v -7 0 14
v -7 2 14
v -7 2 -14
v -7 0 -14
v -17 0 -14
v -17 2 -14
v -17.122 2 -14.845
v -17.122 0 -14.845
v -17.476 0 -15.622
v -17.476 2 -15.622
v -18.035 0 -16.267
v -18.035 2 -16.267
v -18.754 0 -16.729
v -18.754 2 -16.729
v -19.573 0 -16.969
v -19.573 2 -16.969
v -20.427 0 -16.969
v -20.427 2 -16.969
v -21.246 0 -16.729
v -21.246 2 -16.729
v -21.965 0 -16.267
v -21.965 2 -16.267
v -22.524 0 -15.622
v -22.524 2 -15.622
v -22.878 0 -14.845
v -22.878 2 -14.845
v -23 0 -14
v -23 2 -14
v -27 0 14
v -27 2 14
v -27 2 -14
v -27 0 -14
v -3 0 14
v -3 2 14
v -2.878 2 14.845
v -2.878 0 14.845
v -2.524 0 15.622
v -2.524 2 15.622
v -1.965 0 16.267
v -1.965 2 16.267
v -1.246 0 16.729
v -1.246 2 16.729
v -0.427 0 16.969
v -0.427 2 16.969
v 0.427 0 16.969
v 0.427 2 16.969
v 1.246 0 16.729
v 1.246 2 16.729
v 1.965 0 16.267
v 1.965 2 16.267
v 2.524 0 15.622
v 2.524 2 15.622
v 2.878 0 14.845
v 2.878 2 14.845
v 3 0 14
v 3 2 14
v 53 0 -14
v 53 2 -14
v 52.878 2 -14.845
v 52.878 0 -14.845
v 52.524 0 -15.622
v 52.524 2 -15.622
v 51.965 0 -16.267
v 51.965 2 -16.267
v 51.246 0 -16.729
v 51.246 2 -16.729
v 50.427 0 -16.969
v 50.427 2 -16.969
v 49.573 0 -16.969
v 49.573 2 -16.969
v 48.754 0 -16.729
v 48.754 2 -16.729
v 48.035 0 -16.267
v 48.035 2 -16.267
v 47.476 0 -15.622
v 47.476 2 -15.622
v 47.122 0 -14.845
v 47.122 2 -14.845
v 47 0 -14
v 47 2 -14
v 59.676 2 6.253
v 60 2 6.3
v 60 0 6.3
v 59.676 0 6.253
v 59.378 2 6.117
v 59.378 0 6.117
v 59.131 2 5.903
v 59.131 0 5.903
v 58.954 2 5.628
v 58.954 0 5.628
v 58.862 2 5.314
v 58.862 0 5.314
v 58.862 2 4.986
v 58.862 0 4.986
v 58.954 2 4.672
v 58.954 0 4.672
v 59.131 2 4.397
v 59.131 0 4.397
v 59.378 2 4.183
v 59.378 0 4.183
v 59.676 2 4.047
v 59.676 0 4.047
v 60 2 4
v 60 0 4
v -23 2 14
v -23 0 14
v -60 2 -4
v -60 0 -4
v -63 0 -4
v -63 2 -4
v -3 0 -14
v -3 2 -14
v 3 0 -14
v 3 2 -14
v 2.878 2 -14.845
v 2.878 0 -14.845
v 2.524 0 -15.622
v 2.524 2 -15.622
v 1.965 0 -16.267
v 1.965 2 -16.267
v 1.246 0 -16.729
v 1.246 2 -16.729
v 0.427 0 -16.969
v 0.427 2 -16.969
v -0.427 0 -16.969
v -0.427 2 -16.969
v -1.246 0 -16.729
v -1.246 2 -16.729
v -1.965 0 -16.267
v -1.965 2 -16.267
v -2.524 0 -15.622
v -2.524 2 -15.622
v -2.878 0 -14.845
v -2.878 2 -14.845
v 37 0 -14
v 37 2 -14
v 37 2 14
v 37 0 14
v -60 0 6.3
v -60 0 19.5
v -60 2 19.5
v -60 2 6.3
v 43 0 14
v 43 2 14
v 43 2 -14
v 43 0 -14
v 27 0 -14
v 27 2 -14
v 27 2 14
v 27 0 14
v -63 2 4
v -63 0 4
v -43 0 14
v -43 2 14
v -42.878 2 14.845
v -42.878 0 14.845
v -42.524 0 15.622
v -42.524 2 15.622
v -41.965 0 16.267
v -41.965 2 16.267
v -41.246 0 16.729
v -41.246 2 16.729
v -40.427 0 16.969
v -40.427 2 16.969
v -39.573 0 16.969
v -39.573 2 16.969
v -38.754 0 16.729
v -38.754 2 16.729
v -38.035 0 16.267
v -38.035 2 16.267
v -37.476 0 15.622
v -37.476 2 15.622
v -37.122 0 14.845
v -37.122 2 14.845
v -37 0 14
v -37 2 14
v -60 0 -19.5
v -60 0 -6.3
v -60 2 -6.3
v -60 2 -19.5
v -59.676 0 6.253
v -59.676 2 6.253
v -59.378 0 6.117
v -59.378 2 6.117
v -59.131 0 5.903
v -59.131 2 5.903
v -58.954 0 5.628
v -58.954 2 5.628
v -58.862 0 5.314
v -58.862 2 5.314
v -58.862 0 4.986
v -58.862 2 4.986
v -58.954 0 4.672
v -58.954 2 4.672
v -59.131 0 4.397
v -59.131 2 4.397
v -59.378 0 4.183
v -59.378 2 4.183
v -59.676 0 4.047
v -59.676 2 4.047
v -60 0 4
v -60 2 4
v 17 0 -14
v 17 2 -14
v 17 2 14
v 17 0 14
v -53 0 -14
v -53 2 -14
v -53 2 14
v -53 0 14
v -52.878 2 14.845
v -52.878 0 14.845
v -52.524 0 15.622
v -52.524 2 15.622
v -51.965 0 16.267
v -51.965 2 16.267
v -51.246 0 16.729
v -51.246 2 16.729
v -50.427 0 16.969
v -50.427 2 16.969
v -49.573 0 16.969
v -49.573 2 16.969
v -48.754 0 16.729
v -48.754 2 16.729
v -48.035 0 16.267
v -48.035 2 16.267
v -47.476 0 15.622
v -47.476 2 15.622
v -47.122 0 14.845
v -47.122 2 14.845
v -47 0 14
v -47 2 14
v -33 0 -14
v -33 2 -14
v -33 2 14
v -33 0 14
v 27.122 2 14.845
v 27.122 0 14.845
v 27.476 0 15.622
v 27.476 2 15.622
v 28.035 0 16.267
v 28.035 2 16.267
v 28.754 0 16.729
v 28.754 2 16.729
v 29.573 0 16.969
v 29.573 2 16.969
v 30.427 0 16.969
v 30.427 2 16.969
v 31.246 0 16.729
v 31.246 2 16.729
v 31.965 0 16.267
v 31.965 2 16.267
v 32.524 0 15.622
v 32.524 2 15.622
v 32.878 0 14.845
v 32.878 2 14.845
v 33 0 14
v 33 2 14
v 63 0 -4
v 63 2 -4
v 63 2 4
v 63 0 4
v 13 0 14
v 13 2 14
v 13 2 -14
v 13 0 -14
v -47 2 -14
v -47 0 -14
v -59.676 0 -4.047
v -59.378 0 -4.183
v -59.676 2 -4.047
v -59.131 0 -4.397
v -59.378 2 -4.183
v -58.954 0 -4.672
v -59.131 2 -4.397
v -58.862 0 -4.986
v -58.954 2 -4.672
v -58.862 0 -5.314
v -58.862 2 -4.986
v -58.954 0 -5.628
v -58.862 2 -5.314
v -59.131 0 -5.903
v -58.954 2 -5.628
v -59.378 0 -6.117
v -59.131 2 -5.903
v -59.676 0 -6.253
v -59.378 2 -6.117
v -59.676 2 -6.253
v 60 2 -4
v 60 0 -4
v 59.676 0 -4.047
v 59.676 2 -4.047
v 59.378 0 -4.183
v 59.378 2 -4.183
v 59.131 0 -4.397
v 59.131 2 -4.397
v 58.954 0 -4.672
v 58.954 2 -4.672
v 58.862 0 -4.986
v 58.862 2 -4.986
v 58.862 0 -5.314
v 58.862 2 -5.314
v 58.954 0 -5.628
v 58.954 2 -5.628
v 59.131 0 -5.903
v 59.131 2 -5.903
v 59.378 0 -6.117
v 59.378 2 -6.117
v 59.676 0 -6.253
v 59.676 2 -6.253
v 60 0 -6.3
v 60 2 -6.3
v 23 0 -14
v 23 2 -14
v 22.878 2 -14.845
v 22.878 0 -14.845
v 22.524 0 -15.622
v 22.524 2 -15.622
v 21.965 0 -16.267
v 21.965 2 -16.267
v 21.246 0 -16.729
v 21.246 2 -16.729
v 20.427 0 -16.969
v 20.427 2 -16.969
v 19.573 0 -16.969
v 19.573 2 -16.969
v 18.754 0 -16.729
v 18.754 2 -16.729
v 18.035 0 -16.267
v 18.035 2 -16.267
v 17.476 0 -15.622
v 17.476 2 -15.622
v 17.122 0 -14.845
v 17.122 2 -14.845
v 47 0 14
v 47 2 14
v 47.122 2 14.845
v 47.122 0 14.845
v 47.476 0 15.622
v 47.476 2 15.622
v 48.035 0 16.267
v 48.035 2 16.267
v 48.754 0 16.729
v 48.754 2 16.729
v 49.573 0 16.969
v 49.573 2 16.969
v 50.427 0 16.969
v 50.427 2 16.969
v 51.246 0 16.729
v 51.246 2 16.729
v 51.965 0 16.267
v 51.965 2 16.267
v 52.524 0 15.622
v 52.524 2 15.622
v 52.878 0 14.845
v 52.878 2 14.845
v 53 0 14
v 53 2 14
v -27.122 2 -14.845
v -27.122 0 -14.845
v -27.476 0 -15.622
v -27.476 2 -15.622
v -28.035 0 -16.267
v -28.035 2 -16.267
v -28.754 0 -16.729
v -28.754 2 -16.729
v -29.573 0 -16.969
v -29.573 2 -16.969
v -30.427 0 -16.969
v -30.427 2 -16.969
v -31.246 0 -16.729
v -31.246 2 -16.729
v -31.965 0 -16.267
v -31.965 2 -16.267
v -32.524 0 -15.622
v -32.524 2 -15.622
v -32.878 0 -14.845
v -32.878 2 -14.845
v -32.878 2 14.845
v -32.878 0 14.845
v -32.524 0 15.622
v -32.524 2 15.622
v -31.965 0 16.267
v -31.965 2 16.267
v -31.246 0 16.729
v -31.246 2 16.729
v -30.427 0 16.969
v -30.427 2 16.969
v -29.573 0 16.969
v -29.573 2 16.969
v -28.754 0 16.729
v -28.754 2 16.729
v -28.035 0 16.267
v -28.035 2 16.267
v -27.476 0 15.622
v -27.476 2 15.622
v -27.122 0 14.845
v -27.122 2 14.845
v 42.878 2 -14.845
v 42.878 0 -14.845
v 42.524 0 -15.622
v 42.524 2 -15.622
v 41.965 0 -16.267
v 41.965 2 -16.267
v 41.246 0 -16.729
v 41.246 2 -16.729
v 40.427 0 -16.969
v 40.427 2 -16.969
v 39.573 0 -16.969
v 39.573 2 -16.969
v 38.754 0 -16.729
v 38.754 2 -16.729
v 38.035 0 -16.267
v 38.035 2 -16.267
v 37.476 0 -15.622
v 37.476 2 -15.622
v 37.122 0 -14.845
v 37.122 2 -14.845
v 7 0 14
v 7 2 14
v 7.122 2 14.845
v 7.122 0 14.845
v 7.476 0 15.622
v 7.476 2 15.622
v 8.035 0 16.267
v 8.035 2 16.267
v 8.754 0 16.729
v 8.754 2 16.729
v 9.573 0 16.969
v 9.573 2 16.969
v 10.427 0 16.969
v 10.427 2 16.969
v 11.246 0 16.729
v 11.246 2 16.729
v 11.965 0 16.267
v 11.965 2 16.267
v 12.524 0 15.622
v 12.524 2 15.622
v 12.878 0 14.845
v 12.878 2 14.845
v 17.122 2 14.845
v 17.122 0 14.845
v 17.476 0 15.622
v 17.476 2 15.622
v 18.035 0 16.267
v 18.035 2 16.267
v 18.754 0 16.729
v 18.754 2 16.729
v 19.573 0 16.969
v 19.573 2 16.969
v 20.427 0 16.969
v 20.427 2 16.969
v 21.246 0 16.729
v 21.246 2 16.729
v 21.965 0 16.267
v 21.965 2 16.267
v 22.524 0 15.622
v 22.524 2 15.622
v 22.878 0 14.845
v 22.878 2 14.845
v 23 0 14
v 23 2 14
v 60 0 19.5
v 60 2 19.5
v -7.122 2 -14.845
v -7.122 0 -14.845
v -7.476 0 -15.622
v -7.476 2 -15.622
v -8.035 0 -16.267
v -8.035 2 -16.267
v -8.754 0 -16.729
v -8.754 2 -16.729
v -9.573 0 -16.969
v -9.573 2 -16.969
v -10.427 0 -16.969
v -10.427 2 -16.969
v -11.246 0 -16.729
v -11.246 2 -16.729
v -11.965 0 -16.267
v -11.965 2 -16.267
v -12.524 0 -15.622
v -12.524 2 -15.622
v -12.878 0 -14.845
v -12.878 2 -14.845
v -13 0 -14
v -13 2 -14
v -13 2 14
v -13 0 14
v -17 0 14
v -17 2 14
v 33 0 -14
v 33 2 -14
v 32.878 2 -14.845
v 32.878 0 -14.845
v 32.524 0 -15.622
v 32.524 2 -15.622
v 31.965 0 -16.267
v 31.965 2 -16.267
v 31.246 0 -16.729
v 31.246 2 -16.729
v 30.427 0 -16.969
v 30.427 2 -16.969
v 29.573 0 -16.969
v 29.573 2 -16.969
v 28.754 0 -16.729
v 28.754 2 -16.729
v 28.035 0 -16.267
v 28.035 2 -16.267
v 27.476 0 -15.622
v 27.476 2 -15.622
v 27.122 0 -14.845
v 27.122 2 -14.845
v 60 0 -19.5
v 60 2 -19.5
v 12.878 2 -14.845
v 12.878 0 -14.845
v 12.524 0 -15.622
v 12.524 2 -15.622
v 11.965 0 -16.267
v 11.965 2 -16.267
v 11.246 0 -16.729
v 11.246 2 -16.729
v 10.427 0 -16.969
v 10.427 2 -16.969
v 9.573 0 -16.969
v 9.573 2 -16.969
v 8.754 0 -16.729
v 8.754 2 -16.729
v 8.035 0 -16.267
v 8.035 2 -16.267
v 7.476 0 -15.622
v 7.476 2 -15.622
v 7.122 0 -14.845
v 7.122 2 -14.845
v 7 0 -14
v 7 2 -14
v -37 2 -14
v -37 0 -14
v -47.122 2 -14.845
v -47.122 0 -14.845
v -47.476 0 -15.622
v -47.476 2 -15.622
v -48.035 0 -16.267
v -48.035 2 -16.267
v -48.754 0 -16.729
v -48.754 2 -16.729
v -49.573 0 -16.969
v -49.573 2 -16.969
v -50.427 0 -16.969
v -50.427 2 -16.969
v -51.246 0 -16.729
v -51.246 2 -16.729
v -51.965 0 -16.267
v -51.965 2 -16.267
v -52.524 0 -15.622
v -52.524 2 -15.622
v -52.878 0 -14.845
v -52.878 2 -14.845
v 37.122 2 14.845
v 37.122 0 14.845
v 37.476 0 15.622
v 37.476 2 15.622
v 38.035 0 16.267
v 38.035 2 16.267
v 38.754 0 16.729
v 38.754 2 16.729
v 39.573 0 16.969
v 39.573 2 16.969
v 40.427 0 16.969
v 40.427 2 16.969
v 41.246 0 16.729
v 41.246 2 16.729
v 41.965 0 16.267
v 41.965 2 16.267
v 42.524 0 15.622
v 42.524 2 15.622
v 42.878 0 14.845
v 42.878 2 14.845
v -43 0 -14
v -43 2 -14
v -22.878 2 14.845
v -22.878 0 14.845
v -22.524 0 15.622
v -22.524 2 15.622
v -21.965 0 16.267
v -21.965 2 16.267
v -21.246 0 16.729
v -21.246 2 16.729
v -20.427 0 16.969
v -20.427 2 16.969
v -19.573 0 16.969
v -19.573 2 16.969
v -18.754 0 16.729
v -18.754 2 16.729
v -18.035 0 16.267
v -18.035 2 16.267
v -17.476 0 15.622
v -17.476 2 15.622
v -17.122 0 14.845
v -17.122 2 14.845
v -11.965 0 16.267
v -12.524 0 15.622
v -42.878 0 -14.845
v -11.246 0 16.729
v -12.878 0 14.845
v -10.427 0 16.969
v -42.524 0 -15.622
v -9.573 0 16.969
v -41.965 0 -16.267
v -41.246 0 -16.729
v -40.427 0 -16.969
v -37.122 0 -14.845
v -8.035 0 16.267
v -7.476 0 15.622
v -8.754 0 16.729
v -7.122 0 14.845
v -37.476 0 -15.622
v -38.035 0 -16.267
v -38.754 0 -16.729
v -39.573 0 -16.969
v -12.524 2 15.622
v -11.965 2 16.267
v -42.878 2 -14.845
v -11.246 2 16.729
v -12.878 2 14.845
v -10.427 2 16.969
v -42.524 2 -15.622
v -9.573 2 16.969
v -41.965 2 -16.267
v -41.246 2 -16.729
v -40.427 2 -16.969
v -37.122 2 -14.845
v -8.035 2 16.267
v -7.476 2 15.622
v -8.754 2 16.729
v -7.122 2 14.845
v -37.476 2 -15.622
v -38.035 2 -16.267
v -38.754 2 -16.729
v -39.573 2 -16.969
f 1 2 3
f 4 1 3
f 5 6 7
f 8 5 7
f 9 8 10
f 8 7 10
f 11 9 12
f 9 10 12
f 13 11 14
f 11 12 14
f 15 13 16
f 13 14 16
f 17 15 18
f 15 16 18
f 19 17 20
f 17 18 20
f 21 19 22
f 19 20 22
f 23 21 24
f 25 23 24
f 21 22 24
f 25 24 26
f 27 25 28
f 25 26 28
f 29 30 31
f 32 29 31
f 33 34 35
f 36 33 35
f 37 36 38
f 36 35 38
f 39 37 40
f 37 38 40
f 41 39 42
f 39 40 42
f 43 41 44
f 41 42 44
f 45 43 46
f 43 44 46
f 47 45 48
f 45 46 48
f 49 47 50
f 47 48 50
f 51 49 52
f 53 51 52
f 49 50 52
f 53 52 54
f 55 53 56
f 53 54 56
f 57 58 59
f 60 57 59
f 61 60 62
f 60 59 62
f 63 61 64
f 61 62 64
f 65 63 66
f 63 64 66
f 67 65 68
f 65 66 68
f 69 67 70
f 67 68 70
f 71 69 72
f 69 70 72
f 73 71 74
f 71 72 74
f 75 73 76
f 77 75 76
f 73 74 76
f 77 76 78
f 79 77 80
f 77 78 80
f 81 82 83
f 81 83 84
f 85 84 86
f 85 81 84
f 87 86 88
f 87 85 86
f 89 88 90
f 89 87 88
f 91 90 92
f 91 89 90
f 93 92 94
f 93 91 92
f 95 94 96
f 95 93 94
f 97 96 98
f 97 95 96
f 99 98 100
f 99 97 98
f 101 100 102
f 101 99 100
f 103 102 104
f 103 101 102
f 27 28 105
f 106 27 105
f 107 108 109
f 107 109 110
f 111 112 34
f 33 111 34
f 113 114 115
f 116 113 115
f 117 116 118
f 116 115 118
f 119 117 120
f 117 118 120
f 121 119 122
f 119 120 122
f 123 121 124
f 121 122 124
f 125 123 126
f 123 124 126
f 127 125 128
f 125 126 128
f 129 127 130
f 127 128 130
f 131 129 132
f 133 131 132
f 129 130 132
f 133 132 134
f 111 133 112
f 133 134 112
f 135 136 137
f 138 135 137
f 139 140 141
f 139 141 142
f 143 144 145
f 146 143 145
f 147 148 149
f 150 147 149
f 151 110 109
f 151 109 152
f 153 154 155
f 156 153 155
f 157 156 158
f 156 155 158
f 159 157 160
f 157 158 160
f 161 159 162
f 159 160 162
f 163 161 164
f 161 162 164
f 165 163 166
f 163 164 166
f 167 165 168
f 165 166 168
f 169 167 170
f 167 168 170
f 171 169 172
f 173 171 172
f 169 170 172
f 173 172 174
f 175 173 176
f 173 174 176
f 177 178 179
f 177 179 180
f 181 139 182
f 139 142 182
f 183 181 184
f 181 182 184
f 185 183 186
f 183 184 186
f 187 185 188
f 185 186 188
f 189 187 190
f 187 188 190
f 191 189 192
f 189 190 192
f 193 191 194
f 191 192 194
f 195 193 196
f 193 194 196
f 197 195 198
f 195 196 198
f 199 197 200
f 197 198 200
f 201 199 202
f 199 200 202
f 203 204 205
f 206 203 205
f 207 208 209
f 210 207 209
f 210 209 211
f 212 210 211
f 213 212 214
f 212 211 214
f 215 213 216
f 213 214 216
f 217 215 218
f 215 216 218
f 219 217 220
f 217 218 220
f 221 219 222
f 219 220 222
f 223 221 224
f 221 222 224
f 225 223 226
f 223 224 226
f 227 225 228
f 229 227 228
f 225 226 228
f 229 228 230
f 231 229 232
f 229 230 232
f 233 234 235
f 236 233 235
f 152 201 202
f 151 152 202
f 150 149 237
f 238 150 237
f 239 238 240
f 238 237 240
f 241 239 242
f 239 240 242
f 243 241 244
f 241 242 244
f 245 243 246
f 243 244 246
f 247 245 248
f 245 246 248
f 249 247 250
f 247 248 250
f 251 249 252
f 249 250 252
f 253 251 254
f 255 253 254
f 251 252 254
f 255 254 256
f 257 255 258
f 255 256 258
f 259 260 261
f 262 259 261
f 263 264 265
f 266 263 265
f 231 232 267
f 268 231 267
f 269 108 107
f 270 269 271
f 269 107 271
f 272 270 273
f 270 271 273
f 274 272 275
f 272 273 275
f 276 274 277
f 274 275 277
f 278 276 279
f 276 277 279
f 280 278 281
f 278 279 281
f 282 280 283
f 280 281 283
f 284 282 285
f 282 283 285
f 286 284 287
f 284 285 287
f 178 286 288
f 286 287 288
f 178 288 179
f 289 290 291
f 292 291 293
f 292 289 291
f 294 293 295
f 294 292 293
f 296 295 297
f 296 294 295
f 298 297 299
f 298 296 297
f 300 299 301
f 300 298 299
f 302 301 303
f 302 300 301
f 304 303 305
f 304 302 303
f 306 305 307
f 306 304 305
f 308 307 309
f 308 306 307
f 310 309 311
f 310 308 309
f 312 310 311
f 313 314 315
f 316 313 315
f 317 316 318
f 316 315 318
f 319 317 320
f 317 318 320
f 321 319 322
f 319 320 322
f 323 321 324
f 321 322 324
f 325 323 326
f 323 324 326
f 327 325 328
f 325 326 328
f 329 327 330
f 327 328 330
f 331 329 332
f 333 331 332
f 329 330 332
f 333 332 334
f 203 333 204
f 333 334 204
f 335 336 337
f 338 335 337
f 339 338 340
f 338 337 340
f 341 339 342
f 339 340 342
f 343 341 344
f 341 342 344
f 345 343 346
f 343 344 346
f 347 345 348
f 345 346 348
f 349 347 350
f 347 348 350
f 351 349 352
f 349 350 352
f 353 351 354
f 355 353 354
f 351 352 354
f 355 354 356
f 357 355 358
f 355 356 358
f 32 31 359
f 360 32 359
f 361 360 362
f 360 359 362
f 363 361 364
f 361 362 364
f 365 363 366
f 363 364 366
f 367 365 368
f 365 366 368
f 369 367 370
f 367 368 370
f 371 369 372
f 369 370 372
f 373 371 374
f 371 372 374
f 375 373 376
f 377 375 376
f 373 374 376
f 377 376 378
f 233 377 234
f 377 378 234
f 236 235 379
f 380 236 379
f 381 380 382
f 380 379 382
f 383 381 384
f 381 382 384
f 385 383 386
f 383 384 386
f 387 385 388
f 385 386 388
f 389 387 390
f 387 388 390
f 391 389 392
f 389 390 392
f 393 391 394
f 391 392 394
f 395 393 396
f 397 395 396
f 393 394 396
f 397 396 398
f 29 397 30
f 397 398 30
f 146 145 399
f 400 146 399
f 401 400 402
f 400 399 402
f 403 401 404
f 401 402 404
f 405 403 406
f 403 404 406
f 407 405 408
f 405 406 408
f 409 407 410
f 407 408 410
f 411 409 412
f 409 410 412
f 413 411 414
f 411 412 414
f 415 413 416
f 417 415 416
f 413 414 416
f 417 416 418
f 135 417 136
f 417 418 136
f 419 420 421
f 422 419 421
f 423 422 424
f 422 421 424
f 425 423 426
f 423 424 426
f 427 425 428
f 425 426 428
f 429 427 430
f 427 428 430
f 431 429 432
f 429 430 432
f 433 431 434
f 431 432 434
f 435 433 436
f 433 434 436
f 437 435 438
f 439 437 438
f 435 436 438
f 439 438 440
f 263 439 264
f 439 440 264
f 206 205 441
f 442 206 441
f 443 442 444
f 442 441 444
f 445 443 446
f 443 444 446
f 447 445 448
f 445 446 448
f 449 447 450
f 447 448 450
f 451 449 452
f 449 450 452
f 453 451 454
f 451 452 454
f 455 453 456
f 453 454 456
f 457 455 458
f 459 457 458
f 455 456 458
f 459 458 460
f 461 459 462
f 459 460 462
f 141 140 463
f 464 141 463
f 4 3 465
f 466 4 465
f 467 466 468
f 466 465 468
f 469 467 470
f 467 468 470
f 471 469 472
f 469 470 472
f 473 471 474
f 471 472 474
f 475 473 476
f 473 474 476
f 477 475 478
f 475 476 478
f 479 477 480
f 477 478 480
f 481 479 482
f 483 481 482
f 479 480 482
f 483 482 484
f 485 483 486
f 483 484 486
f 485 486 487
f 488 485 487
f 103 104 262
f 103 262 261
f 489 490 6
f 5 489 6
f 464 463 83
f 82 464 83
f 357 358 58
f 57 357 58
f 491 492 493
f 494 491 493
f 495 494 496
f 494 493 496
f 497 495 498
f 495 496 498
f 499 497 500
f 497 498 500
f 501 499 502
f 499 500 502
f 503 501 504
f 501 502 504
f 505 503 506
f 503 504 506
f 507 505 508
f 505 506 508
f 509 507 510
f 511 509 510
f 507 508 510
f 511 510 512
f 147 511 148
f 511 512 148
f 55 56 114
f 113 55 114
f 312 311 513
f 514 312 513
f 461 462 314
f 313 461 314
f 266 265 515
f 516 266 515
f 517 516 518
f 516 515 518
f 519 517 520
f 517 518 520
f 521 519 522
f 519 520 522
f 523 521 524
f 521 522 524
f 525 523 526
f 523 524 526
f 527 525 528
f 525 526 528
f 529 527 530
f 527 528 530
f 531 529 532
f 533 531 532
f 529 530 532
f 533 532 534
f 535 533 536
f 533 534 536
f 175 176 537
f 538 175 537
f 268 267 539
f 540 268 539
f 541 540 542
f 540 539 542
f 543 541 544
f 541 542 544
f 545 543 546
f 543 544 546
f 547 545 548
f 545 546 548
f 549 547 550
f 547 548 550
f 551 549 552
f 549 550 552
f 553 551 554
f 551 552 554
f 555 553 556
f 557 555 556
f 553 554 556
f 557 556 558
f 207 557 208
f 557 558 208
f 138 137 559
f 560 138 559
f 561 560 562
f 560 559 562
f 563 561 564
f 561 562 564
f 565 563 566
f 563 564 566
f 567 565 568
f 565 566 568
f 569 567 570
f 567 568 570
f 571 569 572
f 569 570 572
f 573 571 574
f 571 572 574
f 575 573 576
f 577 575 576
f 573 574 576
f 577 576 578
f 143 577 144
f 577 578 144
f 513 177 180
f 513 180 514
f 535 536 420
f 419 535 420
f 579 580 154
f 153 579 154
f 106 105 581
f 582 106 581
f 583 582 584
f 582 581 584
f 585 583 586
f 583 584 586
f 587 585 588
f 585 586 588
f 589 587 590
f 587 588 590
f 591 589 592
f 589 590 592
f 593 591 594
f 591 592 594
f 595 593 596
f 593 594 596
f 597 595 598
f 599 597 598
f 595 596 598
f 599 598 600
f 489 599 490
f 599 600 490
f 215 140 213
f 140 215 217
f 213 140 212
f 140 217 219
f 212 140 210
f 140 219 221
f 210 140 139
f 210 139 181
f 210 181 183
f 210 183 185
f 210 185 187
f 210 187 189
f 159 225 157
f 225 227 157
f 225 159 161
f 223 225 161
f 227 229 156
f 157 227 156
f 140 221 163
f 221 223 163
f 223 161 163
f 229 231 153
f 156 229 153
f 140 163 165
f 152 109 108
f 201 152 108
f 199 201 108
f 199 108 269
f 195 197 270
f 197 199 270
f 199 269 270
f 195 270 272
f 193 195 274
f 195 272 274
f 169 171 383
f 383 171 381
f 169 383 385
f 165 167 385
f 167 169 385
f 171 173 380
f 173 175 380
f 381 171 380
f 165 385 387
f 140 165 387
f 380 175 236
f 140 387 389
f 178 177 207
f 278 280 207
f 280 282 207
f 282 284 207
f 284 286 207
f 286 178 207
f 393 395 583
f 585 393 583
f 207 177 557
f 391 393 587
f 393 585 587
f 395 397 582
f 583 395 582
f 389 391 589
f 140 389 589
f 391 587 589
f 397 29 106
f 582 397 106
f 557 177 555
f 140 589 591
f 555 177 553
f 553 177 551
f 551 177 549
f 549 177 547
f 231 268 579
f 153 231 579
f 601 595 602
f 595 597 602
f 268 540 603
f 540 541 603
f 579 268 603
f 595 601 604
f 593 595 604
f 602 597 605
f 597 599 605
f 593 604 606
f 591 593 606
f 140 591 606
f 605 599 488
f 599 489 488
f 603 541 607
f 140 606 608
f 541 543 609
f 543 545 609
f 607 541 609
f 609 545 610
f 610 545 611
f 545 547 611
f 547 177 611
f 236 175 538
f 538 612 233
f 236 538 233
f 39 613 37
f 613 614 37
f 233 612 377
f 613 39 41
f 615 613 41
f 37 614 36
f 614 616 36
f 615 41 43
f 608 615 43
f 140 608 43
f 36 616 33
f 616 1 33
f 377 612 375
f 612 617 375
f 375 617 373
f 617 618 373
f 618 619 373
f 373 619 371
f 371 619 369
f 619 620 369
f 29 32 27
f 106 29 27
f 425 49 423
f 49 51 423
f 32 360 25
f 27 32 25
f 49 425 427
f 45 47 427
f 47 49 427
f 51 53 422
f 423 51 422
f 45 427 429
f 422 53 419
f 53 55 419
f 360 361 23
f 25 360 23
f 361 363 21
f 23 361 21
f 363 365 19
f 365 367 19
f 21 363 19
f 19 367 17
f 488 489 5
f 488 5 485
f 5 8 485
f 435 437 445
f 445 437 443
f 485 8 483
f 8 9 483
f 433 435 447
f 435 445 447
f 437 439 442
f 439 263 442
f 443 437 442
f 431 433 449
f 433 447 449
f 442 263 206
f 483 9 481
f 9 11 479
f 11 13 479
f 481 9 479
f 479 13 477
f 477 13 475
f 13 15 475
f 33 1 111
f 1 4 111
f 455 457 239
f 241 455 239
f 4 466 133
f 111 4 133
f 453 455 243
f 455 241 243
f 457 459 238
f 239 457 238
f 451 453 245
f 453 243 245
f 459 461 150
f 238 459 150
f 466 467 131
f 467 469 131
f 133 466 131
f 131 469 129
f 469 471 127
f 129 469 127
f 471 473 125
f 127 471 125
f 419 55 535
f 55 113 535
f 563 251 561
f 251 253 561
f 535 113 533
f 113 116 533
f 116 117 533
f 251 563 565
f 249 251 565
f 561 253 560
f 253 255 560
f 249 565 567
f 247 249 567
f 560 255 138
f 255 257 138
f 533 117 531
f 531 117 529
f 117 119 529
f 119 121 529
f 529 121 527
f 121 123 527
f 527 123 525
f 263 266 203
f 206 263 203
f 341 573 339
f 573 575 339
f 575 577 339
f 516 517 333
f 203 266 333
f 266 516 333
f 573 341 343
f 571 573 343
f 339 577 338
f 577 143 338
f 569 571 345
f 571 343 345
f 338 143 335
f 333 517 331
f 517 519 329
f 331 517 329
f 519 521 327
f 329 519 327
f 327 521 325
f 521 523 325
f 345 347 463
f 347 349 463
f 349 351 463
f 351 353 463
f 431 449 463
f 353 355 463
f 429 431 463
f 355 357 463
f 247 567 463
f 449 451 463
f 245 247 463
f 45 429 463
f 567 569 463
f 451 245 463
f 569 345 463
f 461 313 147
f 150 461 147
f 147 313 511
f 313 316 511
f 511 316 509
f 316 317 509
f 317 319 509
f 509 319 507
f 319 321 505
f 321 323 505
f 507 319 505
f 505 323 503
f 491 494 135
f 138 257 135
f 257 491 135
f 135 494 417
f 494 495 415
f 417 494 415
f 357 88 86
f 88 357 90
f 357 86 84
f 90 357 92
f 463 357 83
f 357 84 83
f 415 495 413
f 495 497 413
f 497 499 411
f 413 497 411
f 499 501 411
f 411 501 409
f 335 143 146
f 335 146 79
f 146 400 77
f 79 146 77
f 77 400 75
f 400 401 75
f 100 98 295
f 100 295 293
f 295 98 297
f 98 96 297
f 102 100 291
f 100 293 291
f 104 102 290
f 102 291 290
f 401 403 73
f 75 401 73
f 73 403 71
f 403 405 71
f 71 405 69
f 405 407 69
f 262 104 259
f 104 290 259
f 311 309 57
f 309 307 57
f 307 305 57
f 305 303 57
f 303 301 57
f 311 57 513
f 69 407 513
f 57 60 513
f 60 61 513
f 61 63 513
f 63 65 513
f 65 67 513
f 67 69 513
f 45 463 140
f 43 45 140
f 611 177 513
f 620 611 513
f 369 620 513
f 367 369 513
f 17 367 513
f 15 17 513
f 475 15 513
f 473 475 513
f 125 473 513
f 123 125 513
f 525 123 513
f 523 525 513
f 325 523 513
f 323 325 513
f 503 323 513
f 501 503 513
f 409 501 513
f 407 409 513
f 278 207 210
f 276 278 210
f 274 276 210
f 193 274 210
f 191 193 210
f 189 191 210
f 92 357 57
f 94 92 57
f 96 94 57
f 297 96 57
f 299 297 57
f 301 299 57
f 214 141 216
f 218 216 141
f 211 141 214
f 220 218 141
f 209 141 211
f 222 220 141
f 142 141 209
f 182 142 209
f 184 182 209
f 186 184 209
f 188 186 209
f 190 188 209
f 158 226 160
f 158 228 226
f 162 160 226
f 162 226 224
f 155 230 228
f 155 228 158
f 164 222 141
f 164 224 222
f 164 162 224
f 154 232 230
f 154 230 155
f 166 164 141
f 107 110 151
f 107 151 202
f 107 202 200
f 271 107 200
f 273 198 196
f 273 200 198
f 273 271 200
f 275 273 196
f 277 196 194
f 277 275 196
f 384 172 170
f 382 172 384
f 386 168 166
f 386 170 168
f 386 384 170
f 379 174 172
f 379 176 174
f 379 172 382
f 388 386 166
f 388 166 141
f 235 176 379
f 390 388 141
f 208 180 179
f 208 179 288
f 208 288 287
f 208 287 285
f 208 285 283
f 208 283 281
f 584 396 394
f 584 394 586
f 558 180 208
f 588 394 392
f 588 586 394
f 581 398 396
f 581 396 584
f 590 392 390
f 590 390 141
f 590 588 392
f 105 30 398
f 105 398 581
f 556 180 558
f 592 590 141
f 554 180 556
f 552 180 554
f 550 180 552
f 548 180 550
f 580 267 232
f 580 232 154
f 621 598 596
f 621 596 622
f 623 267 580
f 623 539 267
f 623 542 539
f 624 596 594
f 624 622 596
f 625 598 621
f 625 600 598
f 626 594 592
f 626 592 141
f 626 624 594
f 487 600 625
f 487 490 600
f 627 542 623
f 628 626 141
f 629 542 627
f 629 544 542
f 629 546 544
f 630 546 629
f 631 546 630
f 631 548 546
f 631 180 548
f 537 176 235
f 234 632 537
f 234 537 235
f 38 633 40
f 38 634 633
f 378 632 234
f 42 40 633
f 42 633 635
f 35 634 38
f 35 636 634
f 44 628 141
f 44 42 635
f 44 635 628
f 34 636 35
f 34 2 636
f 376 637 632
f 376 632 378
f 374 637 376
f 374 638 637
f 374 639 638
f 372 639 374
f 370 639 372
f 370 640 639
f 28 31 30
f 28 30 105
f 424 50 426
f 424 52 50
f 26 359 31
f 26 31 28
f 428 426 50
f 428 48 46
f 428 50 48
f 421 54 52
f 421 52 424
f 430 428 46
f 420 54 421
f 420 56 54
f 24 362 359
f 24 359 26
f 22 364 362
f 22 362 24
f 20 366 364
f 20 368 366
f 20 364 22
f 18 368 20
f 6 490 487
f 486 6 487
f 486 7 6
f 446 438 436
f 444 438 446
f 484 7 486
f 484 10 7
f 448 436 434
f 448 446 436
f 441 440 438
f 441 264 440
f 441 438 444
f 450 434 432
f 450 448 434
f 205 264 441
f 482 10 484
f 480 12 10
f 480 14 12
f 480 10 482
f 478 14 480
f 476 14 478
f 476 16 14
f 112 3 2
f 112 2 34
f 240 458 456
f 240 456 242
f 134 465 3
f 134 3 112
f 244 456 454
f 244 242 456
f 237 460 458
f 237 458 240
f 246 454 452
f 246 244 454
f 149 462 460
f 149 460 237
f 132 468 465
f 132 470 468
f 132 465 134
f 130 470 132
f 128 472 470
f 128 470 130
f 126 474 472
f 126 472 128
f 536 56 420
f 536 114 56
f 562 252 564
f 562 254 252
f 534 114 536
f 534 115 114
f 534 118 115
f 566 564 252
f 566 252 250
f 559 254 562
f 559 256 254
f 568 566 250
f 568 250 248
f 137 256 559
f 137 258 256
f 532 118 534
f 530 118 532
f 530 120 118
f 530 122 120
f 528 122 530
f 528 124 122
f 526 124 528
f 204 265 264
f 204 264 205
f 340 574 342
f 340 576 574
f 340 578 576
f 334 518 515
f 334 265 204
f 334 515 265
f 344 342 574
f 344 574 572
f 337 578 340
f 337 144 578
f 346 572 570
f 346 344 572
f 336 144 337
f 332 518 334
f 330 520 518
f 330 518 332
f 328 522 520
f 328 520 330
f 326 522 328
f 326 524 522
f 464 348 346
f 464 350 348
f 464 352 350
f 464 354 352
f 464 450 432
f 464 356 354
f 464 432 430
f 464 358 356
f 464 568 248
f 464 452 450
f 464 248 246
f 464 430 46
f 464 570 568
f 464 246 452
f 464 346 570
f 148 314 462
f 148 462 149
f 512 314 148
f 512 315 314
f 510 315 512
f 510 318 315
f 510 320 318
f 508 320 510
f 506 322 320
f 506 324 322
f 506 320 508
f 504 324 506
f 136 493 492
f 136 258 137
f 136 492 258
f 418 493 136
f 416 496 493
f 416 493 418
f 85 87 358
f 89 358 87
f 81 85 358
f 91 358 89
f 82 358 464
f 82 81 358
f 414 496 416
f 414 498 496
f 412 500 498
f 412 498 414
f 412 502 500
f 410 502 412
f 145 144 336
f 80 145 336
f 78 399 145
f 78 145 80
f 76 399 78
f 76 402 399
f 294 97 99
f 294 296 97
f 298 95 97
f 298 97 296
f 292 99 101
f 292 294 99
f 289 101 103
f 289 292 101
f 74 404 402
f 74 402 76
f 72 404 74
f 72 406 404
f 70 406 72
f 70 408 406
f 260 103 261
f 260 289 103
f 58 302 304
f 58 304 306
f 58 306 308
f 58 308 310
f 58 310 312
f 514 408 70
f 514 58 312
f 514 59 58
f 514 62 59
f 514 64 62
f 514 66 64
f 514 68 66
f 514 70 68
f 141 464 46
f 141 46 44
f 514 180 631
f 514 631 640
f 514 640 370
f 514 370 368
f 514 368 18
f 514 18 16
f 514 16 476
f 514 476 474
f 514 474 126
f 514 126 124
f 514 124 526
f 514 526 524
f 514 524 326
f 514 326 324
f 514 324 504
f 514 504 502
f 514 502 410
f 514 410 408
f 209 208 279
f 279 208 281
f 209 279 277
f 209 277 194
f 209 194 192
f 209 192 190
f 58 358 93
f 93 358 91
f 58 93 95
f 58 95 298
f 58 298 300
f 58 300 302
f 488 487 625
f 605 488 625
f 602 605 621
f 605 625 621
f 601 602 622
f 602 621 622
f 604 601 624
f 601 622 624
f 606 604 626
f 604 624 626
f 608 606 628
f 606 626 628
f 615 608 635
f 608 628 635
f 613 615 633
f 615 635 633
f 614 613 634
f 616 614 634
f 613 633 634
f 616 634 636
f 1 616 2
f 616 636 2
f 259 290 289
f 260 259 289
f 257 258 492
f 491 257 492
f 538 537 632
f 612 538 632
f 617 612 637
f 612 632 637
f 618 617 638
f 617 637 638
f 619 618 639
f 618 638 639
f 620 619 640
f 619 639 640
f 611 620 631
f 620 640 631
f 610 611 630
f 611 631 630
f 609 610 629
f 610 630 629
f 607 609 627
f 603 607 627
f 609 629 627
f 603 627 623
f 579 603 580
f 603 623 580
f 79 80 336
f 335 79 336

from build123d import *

# Parameters (mm, degrees)
SKETCH_1_W                 = 120
SKETCH_1_H                 = 39
EXTRUDE_1_DEPTH            = 2
SKETCH_2_W                 = 8
SKETCH_2_H                 = 2
EXTRUDE_2_DEPTH            = 3
SKETCH_3_R                 = 1.15
CUT_EXTRUDE_1_DEPTH        = 66.979163378
CUT_EXTRUDE_2_DEPTH        = 66.979163378
PATTERN_LINEAR_1_COUNT     = 6
PATTERN_LINEAR_1_PITCH     = 10
PATTERN_LINEAR_1_COL_COUNT = 6
PATTERN_LINEAR_1_COL_PITCH = 10


with BuildPart() as part:
    # 草图1 → 凸台-拉伸1 (new body)
    with BuildSketch(Plane(origin=(0, 0, 0), x_dir=(1, 0, 0), z_dir=(0, 1, 0))):
        Rectangle(SKETCH_1_W, SKETCH_1_H)
    extrude(amount=EXTRUDE_1_DEPTH)

    # 草图2 → 凸台-拉伸2 (add)
    with BuildSketch(Plane.ZY.offset(60)):
        with Locations((0, 1)):
            Rectangle(SKETCH_2_W, SKETCH_2_H)
    extrude_2 = extrude(amount=EXTRUDE_2_DEPTH)

    # 草图3 → 切除-拉伸1 (cut, through all)
    with BuildSketch(Plane(origin=(0, 2, 0), x_dir=(1, 0, 0), z_dir=(0, 1, 0))):
        with Locations((-60, 5.15)):
            Circle(SKETCH_3_R)
        with Locations((-60, -5.15)):
            Circle(SKETCH_3_R)
    cut_extrude_1 = extrude(amount=-CUT_EXTRUDE_1_DEPTH, mode=Mode.SUBTRACT)

    # 镜向1: 凸台-拉伸2, 切除-拉伸1 across plane
    add(extrude_2.mirror(Plane(origin=(0, 0, 0), x_dir=(0, 0, 1), z_dir=(1, 0, 0))))
    add(cut_extrude_1.mirror(Plane(origin=(0, 0, 0), x_dir=(0, 0, 1), z_dir=(1, 0, 0))), mode=Mode.SUBTRACT)

    # 草图4 → 切除-拉伸2 (cut, through all)
    with BuildSketch(Plane(origin=(0, 2, 0), x_dir=(1, 0, 0), z_dir=(0, 1, 0))):
        with BuildLine():
            ThreePointArc((-3, -14), (0, -11), (3, -14))
            Line((3, -14), (3, 14))
            ThreePointArc((3, 14), (0, 11), (-3, 14))
            Line((-3, 14), (-3, -14))
        make_face()
        with BuildLine():
            ThreePointArc((-3, 14), (0, 11), (3, 14))
            Line((3, 14), (-3, 14))
        make_face()
        with BuildLine():
            Line((-3, 14), (3, 14))
            ThreePointArc((3, 14), (0, 17), (-3, 14))
        make_face()
        with BuildLine():
            ThreePointArc((-3, -14), (0, -17), (3, -14))
            Line((3, -14), (-3, -14))
        make_face()
        with BuildLine():
            Line((-3, -14), (3, -14))
            ThreePointArc((3, -14), (0, -11), (-3, -14))
        make_face()
    cut_extrude_2 = extrude(amount=-CUT_EXTRUDE_2_DEPTH, mode=Mode.SUBTRACT)

    # 阵列(线性)1: 切除-拉伸2 ×6
    with Locations(*[(-i * PATTERN_LINEAR_1_PITCH, 0, 0) for i in range(1, PATTERN_LINEAR_1_COUNT)]):
        add(cut_extrude_2, mode=Mode.SUBTRACT)

    # 阵列(线性)1 col: 切除-拉伸2 ×6
    with Locations(*[(i * PATTERN_LINEAR_1_COL_PITCH, 0, 0) for i in range(1, PATTERN_LINEAR_1_COL_COUNT)]):
        add(cut_extrude_2, mode=Mode.SUBTRACT)


solid = part.part
